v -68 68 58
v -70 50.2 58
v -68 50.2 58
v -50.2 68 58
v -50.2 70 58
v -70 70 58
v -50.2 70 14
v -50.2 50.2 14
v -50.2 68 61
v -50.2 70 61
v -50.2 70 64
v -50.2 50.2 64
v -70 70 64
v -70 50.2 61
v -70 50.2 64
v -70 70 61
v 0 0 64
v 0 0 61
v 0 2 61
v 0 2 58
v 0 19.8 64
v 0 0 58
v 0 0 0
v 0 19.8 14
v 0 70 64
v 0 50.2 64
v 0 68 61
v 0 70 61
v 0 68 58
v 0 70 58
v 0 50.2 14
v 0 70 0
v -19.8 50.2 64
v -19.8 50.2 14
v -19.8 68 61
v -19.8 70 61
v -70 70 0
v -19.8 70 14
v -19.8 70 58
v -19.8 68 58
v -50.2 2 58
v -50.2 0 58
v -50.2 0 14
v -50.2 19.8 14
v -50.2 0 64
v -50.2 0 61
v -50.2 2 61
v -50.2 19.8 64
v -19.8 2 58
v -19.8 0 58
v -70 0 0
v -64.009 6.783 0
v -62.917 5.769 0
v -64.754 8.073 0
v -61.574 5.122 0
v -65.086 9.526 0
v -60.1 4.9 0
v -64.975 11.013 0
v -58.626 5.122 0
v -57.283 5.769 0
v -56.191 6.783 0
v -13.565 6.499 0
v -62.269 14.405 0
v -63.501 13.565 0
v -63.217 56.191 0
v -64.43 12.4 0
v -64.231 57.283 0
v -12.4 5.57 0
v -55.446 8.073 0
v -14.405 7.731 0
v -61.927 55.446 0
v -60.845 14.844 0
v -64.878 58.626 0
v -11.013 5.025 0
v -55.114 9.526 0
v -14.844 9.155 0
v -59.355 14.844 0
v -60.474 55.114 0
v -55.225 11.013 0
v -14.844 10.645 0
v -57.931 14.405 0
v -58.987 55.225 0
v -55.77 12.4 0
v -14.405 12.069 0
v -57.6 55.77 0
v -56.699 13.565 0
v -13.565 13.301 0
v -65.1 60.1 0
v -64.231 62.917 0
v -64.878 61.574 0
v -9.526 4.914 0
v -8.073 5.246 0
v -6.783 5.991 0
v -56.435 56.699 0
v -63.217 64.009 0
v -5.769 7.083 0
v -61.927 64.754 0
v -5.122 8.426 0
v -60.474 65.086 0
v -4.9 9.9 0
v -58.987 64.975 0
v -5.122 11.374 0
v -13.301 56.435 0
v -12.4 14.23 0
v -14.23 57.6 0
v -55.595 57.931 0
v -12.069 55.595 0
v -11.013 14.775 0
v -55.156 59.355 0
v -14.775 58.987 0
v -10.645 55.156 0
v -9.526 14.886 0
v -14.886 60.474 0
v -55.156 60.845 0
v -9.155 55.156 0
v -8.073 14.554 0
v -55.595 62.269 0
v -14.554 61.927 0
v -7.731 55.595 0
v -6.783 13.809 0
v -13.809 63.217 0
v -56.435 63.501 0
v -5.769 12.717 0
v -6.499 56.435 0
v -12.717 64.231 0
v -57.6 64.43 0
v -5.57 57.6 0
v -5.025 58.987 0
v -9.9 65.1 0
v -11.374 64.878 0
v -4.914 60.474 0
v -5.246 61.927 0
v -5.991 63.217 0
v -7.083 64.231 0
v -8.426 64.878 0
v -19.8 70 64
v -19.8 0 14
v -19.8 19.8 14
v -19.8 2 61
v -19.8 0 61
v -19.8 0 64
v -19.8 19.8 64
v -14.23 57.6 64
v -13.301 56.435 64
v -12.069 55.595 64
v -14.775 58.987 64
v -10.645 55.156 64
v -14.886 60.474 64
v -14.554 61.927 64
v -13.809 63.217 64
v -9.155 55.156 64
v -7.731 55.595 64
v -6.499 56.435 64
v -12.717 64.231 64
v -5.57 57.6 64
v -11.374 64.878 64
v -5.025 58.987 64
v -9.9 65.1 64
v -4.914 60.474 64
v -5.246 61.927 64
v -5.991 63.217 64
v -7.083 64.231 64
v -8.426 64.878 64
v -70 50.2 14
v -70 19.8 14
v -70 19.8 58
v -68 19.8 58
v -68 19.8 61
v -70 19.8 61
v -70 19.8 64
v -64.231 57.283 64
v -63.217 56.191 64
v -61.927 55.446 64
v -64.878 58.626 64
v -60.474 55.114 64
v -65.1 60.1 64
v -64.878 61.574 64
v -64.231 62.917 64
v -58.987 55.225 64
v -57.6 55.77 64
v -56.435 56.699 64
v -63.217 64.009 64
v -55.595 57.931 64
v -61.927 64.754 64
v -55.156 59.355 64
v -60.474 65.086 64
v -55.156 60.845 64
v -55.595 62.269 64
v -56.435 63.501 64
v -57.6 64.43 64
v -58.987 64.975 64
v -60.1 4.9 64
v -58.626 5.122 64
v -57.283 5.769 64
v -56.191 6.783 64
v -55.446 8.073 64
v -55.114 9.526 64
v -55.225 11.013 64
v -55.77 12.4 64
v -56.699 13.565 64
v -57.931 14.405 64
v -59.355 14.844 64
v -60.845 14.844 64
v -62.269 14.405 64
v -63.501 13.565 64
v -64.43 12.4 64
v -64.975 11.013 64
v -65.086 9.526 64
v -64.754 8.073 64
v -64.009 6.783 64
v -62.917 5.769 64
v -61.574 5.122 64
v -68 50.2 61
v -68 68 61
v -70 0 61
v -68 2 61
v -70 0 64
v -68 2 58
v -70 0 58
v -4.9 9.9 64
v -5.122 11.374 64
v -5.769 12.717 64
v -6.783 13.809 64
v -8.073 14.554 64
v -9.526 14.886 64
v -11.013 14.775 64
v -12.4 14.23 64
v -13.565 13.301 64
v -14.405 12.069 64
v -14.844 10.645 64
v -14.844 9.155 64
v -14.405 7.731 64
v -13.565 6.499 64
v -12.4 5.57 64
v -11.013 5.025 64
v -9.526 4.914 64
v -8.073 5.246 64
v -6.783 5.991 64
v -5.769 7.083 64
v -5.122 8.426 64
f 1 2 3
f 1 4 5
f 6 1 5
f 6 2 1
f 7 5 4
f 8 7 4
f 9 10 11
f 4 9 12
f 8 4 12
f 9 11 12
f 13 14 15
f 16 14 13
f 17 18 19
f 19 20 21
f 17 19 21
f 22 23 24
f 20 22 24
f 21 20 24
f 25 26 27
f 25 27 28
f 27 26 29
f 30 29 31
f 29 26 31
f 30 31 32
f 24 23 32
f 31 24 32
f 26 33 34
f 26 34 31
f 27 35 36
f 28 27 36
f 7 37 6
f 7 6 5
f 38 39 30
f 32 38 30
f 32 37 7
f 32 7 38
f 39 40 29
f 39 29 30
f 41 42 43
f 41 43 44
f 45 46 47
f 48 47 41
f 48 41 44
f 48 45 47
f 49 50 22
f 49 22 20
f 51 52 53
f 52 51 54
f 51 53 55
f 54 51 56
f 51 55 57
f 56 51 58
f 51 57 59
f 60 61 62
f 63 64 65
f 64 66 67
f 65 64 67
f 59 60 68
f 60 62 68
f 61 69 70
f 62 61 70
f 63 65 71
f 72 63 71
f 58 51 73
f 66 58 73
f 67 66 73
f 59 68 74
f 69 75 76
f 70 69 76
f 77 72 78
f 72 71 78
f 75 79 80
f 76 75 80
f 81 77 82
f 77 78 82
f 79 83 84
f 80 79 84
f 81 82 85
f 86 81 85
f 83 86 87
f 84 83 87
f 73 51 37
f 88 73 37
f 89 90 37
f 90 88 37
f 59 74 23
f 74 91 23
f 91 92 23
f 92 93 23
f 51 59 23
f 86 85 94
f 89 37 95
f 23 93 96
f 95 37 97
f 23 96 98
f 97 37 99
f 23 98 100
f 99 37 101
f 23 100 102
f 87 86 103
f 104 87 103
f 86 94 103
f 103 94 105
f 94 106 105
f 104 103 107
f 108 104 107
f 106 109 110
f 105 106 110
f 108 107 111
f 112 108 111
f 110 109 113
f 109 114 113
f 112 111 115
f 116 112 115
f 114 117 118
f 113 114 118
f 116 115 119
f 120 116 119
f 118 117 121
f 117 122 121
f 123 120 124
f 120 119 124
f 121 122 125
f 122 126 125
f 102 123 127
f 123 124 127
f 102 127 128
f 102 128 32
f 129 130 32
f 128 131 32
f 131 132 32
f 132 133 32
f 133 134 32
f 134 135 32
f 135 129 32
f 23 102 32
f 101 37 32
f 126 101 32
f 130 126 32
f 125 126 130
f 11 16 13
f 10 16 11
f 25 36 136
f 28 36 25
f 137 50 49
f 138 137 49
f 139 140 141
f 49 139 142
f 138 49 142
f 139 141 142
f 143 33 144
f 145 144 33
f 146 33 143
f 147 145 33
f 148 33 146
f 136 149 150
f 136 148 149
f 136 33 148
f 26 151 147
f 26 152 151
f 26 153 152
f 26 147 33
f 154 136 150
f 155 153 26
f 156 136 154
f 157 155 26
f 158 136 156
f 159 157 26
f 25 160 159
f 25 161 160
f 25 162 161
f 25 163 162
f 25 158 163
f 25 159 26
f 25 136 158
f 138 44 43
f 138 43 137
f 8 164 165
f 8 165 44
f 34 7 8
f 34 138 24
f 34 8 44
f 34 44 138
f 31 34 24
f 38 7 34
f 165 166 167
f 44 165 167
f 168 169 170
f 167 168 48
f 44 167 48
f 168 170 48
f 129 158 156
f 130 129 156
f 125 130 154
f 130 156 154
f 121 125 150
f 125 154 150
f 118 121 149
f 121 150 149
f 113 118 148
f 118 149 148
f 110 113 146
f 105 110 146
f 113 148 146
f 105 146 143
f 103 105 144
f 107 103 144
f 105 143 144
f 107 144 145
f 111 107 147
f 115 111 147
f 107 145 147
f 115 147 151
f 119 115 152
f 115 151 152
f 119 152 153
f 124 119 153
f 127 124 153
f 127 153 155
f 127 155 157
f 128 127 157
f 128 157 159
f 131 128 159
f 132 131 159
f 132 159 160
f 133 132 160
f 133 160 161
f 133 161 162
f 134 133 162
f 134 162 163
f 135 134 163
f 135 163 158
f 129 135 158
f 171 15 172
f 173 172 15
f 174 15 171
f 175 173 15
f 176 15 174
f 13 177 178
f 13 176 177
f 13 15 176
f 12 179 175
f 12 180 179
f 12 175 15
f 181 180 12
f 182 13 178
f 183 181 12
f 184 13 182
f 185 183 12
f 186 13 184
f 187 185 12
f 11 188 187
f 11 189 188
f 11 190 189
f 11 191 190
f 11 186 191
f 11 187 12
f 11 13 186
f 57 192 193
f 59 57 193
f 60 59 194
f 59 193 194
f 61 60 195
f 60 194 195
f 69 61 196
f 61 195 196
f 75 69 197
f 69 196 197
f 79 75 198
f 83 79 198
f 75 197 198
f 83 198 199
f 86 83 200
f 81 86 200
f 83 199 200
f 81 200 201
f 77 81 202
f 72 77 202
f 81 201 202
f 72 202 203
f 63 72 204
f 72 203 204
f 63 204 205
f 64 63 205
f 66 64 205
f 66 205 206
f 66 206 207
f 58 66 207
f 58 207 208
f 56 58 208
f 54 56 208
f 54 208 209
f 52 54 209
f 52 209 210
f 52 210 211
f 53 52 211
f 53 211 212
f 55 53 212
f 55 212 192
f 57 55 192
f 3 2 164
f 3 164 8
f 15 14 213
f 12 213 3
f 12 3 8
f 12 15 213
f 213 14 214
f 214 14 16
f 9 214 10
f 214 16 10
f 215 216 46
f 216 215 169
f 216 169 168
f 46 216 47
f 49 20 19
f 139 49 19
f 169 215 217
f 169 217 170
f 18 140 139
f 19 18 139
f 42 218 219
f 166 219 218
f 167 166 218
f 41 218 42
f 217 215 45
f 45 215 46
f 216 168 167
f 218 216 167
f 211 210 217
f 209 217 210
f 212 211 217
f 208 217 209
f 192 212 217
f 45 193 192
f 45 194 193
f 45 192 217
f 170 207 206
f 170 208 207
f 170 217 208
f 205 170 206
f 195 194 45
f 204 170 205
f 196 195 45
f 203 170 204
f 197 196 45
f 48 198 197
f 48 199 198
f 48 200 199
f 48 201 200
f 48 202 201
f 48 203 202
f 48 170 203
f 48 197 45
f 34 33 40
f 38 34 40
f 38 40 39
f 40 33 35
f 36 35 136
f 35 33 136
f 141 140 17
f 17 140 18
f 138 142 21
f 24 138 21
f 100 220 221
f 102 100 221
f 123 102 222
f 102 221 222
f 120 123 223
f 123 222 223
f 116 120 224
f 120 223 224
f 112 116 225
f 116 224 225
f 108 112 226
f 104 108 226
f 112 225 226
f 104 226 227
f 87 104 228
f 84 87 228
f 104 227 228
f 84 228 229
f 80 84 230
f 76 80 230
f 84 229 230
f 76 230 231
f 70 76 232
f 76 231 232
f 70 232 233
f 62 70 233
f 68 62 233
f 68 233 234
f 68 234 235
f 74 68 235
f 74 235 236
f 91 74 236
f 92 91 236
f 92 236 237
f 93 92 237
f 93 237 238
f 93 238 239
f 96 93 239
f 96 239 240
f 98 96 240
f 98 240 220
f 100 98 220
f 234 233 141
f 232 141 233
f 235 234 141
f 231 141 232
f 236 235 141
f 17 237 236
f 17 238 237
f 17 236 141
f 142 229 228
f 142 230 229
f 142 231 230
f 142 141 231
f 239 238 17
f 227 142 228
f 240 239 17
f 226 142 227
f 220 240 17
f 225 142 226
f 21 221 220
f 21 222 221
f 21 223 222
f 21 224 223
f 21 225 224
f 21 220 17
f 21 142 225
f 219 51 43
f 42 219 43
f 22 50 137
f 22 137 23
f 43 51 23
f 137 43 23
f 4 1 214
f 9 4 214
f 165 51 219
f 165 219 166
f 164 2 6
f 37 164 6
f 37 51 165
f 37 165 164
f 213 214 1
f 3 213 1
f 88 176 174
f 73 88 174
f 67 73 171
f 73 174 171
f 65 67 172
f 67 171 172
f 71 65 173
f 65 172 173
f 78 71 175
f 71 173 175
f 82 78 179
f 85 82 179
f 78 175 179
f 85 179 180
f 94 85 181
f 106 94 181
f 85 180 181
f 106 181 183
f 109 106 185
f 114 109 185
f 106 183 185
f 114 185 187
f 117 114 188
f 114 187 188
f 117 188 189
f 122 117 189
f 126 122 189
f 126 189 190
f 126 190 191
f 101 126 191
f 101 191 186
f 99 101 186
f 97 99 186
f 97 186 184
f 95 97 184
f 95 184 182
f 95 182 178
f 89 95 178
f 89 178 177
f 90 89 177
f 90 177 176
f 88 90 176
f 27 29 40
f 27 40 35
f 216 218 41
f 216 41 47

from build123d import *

# Parameters (mm, degrees)
ESQUISSE1_W                  = 70
ESQUISSE1_H                  = 70
BOSS_EXTRU_1_DEPTH           = 64
ESQUISSE2_W                  = 30.4
ESQUISSE2_H                  = 19.8
ESQUISSE2_H_2                = 30.4
ESQUISSE2_W_2                = 19.8
ENL_V_MAT_EXTRU_1_DEPTH      = 50
ESQUISSE5_W                  = 3
ESQUISSE5_H                  = 2
ENL_V_MAT_EXTRU_3_DEPTH      = 71
ESQUISSE6_W                  = 2
ESQUISSE6_H                  = 3
ENL_V_MAT_EXTRU_4_DEPTH      = 71
ESQUISSE7_R                  = 5
ENL_V_MAT_EXTRU_5_DEPTH      = 65
R_P_TITION_CIRCULAIRE2_COUNT = 4


with BuildPart() as part:
    # Esquisse1 → Boss.-Extru.1 (new body)
    with BuildSketch(Plane.XY):
        with Locations((-35, 35)):
            Rectangle(ESQUISSE1_W, ESQUISSE1_H)
    extrude(amount=BOSS_EXTRU_1_DEPTH)

    # Esquisse2 → Enlèv. mat.-Extru.1 (cut)
    with BuildSketch(Plane.XY.offset(64)):
        with Locations((-35, 60.1)):
            Rectangle(ESQUISSE2_W, ESQUISSE2_H)
        with Locations((-35, 35)):
            Rectangle(ESQUISSE2_W, ESQUISSE2_H_2)
        with Locations((-9.9, 35)):
            Rectangle(ESQUISSE2_W_2, ESQUISSE2_H_2)
        with Locations((-60.1, 35)):
            Rectangle(ESQUISSE2_W_2, ESQUISSE2_H_2)
        with Locations((-35, 9.9)):
            Rectangle(ESQUISSE2_W, ESQUISSE2_H)
    extrude(amount=-ENL_V_MAT_EXTRU_1_DEPTH, mode=Mode.SUBTRACT)

    # Esquisse5 → Enlèv. mat.-Extru.3 (cut, through all)
    with BuildSketch(Plane.ZY.offset(70)):
        with Locations((59.5, 69)):
            Rectangle(ESQUISSE5_W, ESQUISSE5_H)
        with Locations((59.5, 1)):
            Rectangle(ESQUISSE5_W, ESQUISSE5_H)
    extrude(amount=-ENL_V_MAT_EXTRU_3_DEPTH, mode=Mode.SUBTRACT)

    # Esquisse6 → Enlèv. mat.-Extru.4 (cut, through all)
    with BuildSketch(Plane(origin=(0, 70, 0), x_dir=(1, 0, 0), z_dir=(0, 1, 0))):
        with Locations((-69, -59.5)):
            Rectangle(ESQUISSE6_W, ESQUISSE6_H)
    extrude(amount=-ENL_V_MAT_EXTRU_4_DEPTH, mode=Mode.SUBTRACT)

    # Esquisse7 → Enlèv. mat.-Extru.5 (cut, through all)
    with BuildSketch(Plane.XY.offset(64)):
        with Locations((-9.9, 9.9)):
            Circle(ESQUISSE7_R)
    enl_v_mat_extru_5 = extrude(amount=-ENL_V_MAT_EXTRU_5_DEPTH, mode=Mode.SUBTRACT)

    # Répétition circulaire2: Enlèv. mat.-Extru.5 ×4 about axis
    r_p_tition_circulaire2_axis = Axis((-35, 35, 0), (0, 0, 1))
    for i in range(1, R_P_TITION_CIRCULAIRE2_COUNT):
        add(enl_v_mat_extru_5.rotate(r_p_tition_circulaire2_axis, i * 360 / R_P_TITION_CIRCULAIRE2_COUNT), mode=Mode.SUBTRACT)


solid = part.part
